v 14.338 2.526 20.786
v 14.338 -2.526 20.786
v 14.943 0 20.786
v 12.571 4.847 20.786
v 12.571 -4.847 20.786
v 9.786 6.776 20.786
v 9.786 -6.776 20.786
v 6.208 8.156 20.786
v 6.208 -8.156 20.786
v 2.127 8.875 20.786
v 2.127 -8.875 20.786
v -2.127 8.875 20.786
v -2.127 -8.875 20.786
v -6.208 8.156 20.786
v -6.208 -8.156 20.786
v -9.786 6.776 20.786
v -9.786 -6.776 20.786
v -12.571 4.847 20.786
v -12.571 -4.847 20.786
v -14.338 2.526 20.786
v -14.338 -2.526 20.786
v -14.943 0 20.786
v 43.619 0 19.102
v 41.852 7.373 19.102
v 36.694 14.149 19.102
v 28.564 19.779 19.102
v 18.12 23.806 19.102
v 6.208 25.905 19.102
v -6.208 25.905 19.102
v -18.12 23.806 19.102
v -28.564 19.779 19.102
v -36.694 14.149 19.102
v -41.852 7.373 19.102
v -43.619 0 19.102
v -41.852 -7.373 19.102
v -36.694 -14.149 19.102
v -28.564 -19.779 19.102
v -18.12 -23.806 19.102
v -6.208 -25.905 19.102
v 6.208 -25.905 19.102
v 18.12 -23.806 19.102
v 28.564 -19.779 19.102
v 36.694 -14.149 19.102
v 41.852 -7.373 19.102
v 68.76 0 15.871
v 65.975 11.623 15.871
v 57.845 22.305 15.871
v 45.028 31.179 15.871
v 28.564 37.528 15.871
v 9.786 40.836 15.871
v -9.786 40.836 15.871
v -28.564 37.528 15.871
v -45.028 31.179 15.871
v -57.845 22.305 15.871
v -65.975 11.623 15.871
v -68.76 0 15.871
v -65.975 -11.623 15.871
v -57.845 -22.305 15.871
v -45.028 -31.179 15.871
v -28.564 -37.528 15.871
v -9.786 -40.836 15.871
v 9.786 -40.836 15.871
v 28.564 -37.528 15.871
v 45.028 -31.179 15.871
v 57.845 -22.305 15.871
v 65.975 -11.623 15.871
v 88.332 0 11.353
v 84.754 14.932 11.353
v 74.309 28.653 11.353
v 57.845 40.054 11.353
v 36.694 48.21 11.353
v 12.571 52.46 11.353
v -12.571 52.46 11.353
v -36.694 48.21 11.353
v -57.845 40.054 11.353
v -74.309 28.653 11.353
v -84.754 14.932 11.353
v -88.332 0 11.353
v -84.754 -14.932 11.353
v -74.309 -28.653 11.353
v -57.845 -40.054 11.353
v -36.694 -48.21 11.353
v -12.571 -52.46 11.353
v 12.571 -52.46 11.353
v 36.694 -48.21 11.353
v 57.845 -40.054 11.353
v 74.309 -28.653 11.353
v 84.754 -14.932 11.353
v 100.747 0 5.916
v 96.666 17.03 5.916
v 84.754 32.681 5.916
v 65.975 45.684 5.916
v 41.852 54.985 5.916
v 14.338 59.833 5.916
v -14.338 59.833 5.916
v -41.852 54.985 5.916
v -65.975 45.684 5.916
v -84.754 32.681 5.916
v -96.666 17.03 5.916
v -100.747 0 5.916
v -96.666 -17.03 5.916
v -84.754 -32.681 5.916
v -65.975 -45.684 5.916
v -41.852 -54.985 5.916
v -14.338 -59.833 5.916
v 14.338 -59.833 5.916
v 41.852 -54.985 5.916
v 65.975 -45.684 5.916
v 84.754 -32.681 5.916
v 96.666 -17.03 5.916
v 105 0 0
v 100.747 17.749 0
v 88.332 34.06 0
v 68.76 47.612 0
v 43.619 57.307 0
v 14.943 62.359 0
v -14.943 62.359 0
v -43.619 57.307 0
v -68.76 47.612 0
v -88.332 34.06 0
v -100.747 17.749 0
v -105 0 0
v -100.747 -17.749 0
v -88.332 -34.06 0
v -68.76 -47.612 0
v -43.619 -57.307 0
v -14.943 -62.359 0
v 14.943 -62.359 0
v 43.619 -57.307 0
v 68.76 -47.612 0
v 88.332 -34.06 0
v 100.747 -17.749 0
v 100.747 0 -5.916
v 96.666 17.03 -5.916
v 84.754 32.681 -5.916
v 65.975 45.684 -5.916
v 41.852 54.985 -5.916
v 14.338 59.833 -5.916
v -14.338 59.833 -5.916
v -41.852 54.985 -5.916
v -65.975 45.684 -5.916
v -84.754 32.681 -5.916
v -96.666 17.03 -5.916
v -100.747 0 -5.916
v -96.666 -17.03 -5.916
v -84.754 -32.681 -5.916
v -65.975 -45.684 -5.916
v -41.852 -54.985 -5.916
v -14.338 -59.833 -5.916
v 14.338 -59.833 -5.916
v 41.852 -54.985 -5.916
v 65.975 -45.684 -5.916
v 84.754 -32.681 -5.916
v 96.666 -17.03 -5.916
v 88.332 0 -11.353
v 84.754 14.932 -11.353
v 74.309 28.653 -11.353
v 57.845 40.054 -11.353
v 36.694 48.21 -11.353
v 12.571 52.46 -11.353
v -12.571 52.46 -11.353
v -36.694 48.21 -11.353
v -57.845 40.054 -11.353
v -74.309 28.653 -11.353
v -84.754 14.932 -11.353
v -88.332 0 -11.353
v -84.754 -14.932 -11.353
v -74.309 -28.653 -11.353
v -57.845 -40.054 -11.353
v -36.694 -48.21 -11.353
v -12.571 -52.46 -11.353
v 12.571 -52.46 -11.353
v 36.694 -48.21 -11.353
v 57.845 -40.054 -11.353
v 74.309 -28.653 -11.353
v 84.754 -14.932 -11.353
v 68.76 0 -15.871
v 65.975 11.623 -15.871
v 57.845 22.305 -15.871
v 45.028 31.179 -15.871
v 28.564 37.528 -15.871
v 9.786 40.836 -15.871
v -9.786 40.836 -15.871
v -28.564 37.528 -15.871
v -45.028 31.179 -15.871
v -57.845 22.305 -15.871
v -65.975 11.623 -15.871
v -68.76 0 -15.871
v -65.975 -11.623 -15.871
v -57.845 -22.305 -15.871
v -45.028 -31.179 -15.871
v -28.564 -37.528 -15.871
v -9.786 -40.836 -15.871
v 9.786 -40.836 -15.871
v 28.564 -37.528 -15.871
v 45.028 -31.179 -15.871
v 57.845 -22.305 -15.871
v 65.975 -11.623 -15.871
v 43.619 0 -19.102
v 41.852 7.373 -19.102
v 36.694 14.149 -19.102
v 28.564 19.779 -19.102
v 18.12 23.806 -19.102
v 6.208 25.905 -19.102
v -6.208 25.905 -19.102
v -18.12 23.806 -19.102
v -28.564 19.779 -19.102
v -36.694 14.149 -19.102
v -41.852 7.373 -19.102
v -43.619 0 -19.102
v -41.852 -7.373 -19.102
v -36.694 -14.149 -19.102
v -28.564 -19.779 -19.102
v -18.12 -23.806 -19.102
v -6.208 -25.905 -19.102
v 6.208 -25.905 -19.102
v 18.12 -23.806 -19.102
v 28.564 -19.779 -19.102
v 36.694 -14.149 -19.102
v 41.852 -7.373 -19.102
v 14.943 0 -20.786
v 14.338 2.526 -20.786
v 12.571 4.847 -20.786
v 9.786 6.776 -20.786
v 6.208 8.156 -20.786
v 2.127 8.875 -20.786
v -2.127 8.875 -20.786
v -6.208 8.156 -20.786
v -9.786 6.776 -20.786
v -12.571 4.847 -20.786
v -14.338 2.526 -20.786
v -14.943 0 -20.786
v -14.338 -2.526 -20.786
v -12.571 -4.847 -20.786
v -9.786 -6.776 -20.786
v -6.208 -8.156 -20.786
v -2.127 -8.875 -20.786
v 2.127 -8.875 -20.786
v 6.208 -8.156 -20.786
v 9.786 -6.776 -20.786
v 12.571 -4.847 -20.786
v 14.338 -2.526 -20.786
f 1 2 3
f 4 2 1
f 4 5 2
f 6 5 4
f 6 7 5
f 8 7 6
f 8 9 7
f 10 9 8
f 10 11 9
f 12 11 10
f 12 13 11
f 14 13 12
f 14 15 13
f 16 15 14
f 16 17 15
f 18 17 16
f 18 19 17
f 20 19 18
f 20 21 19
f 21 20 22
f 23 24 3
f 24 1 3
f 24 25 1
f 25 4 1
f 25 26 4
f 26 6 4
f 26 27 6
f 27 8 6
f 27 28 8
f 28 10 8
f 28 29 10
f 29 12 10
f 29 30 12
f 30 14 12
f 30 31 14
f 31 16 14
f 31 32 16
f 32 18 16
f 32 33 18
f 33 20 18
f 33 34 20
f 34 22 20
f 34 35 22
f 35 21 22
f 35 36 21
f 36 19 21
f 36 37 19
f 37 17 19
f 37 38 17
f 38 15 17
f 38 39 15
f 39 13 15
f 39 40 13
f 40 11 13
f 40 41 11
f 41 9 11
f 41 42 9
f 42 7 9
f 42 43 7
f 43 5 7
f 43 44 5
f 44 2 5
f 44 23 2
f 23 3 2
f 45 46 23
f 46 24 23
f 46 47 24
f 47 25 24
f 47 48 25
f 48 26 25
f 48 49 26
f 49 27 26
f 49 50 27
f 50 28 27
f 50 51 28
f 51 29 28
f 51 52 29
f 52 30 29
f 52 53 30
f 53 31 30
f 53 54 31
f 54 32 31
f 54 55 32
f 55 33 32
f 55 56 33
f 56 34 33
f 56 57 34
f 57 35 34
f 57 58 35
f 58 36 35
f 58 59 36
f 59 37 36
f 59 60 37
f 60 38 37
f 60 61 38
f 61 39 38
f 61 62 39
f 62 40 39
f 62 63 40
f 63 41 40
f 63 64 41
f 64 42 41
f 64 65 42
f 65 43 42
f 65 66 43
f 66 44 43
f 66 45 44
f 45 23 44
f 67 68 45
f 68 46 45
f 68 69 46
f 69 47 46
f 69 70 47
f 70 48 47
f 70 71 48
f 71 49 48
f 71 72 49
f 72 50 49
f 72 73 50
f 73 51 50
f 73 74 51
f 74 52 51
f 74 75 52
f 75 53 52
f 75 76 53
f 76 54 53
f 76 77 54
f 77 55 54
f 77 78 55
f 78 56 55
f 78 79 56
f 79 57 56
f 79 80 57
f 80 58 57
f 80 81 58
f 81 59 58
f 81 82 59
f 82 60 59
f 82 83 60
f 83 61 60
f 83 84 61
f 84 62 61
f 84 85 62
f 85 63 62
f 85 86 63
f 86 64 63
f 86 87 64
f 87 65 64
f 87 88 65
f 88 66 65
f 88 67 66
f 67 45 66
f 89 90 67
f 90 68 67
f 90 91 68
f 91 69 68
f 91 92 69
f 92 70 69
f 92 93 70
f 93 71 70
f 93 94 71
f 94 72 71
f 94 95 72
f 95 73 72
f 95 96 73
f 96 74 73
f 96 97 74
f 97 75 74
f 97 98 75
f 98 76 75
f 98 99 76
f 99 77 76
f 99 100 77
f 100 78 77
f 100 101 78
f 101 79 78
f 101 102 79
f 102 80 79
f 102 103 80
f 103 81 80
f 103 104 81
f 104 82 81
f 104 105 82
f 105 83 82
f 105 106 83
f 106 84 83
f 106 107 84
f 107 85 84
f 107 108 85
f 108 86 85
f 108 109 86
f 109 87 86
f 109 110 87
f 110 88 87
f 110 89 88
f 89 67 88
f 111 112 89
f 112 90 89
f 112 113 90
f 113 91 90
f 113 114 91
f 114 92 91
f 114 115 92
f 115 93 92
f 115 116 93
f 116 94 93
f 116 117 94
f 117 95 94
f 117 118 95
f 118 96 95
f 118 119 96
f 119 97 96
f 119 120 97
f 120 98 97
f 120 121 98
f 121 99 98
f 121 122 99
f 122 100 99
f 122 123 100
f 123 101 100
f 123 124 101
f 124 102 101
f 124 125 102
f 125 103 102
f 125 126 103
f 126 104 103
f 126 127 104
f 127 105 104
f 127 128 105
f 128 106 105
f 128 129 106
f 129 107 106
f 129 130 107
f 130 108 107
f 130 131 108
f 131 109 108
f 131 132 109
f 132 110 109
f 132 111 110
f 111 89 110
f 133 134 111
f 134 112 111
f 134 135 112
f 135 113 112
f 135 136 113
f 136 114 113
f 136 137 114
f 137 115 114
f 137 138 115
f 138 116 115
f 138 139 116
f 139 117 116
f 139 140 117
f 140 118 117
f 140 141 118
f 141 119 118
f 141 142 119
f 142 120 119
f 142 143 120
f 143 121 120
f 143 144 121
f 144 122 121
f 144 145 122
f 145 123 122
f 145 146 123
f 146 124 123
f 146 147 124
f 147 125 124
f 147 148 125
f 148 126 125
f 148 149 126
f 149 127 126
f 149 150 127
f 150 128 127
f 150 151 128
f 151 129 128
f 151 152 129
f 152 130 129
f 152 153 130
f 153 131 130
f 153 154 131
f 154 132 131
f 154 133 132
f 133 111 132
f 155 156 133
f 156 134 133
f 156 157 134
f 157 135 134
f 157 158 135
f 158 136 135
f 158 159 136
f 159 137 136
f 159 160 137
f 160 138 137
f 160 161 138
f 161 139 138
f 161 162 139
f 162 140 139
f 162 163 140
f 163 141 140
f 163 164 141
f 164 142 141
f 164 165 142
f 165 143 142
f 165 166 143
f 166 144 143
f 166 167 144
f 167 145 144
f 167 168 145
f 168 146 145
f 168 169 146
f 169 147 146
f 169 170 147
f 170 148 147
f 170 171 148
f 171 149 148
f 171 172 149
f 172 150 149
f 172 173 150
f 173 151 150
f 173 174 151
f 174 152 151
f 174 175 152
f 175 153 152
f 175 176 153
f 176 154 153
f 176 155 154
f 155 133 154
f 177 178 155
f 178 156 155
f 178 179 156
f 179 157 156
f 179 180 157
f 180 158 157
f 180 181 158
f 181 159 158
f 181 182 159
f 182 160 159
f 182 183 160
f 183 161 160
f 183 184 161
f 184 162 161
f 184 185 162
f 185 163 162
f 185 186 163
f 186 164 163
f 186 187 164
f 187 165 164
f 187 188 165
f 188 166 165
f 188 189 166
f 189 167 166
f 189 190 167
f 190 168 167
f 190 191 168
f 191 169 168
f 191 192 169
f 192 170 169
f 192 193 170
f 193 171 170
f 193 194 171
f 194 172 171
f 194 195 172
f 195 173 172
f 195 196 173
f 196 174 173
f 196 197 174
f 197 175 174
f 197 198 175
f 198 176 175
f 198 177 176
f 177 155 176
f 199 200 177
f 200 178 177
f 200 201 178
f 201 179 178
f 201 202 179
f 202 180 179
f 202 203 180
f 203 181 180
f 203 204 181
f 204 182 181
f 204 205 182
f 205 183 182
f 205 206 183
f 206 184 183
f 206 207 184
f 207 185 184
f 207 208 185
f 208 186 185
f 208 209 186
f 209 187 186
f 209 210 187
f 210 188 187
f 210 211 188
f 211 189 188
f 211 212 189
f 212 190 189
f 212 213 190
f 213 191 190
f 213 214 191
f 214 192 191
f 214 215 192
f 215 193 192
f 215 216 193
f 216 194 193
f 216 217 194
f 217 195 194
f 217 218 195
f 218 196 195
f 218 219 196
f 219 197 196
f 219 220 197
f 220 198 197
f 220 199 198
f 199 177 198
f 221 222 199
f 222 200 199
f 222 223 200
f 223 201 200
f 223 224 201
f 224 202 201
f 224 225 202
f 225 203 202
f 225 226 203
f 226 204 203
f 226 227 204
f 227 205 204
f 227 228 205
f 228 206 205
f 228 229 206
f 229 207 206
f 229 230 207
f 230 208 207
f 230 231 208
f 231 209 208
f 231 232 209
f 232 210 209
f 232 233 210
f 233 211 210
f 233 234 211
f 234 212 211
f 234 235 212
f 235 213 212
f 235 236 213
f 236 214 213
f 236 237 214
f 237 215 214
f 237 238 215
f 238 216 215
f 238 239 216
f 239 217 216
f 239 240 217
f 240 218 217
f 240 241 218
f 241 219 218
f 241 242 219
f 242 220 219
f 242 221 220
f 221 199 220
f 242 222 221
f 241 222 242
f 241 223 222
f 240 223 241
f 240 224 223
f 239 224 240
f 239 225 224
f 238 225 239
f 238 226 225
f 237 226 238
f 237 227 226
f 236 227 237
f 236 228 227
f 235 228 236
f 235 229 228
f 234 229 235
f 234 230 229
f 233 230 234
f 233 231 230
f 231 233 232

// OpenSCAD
// Generated by SolidPython 1.0.1 on 2020-07-29 00:46:51


scale(v = [15, 9, 3]) {
	sphere(r = 7);
}
/***********************************************
*********      SolidPython code:      **********
************************************************
 
# import packages: SolidPython
from solid import *
from solid.utils import *
from itertools import chain, combinations, permutations


class Resize:

    def __init__(self, scad_file):
        self.scad_file = scad_file
        #self.scad_file = import_scad(scad_file)
        # cone/cylinder param:
        self.r1 = 0
        self.r2 = 0
        self.h = 0
        # rectangular prism param:
        self.w = 0
        self.l = 0
        # ellipse param:
        self.r = 0

    # import OpenScad code (file name corresponds to shape)


    # classify shape + parameters
    def assign(self, param1, param2, param3):
        if self.scad_file == 'cone.scad':
            self.r1 = param1
            self.r2 = param2
            self.h = param3
        elif self.scad_file == 'cylinder.scad':
            self.r1 = param1
            self.r2 = param2
            self.h = param3
        elif self.scad_file == 'rectangularPrism.scad':
            self.h = param1
            self.l = param2
            self.w = param3
        else:
            self.r = param1
            self.h = param2

    # resize parameters
    def iterate(self):
        x = range(3, 20, 2)
        i = 1
        if self.scad_file == 'cone.scad':
            tempList = list(permutations(x, 2))
            for temp in tempList:
                param1 = temp[0]
                param2 = temp[1]
                filepath = 'produced_scad_files/' + 'cone' + str(param1) + '_' + str(param2) + '_' + '.scad'
                scad_render_to_file(cylinder(h=param1, r1=param2, r2=0), filepath)

        elif self.scad_file == 'cylinder.scad':
            tempList = list(permutations(x, 3))
            for temp in tempList:
                param1 = temp[0]
                param2 = temp[1]
                filepath = 'produced_scad_files/' + 'cylinder' + str(param1) + '_' + str(param2) + '_' + '.scad'
                scad_render_to_file(cylinder(h=param1, r1=param2, r2=param2), filepath)

        elif self.scad_file == 'rectangularPrism.scad':
            tempList = list(permutations(x, 3))
            for temp in tempList:
                param1 = temp[0]
                param2 = temp[1]
                param3 = temp[2]
                filepath = 'produced_scad_files/' + 'rectangularPrism' + str(param1) + '_' + str(param2) + '_' + str(
                    param3) + '.scad'
                scad_render_to_file(cube(size=(param1, param2, param3)), filepath)

        elif self.scad_file == 'ellipse.scad':
            tempList = list(permutations(x, 4))
            for temp in tempList:
                param1 = temp[0]
                param2 = temp[1]
                param3 = temp[2]
                param4 = temp[3]
                filepath = 'produced_scad_files/' + 'ellipse' + str(param1) + '_' + str(param2) + '_' + str(param3) + '_' + str(param4) + '.scad'
                scad_render_to_file(scale([param1, param2, param3])(sphere(r=param4)), filepath)

    def render_to_scadfile(self):
        scad_render_to_file(scad, 'example.scad') 
 
************************************************/
